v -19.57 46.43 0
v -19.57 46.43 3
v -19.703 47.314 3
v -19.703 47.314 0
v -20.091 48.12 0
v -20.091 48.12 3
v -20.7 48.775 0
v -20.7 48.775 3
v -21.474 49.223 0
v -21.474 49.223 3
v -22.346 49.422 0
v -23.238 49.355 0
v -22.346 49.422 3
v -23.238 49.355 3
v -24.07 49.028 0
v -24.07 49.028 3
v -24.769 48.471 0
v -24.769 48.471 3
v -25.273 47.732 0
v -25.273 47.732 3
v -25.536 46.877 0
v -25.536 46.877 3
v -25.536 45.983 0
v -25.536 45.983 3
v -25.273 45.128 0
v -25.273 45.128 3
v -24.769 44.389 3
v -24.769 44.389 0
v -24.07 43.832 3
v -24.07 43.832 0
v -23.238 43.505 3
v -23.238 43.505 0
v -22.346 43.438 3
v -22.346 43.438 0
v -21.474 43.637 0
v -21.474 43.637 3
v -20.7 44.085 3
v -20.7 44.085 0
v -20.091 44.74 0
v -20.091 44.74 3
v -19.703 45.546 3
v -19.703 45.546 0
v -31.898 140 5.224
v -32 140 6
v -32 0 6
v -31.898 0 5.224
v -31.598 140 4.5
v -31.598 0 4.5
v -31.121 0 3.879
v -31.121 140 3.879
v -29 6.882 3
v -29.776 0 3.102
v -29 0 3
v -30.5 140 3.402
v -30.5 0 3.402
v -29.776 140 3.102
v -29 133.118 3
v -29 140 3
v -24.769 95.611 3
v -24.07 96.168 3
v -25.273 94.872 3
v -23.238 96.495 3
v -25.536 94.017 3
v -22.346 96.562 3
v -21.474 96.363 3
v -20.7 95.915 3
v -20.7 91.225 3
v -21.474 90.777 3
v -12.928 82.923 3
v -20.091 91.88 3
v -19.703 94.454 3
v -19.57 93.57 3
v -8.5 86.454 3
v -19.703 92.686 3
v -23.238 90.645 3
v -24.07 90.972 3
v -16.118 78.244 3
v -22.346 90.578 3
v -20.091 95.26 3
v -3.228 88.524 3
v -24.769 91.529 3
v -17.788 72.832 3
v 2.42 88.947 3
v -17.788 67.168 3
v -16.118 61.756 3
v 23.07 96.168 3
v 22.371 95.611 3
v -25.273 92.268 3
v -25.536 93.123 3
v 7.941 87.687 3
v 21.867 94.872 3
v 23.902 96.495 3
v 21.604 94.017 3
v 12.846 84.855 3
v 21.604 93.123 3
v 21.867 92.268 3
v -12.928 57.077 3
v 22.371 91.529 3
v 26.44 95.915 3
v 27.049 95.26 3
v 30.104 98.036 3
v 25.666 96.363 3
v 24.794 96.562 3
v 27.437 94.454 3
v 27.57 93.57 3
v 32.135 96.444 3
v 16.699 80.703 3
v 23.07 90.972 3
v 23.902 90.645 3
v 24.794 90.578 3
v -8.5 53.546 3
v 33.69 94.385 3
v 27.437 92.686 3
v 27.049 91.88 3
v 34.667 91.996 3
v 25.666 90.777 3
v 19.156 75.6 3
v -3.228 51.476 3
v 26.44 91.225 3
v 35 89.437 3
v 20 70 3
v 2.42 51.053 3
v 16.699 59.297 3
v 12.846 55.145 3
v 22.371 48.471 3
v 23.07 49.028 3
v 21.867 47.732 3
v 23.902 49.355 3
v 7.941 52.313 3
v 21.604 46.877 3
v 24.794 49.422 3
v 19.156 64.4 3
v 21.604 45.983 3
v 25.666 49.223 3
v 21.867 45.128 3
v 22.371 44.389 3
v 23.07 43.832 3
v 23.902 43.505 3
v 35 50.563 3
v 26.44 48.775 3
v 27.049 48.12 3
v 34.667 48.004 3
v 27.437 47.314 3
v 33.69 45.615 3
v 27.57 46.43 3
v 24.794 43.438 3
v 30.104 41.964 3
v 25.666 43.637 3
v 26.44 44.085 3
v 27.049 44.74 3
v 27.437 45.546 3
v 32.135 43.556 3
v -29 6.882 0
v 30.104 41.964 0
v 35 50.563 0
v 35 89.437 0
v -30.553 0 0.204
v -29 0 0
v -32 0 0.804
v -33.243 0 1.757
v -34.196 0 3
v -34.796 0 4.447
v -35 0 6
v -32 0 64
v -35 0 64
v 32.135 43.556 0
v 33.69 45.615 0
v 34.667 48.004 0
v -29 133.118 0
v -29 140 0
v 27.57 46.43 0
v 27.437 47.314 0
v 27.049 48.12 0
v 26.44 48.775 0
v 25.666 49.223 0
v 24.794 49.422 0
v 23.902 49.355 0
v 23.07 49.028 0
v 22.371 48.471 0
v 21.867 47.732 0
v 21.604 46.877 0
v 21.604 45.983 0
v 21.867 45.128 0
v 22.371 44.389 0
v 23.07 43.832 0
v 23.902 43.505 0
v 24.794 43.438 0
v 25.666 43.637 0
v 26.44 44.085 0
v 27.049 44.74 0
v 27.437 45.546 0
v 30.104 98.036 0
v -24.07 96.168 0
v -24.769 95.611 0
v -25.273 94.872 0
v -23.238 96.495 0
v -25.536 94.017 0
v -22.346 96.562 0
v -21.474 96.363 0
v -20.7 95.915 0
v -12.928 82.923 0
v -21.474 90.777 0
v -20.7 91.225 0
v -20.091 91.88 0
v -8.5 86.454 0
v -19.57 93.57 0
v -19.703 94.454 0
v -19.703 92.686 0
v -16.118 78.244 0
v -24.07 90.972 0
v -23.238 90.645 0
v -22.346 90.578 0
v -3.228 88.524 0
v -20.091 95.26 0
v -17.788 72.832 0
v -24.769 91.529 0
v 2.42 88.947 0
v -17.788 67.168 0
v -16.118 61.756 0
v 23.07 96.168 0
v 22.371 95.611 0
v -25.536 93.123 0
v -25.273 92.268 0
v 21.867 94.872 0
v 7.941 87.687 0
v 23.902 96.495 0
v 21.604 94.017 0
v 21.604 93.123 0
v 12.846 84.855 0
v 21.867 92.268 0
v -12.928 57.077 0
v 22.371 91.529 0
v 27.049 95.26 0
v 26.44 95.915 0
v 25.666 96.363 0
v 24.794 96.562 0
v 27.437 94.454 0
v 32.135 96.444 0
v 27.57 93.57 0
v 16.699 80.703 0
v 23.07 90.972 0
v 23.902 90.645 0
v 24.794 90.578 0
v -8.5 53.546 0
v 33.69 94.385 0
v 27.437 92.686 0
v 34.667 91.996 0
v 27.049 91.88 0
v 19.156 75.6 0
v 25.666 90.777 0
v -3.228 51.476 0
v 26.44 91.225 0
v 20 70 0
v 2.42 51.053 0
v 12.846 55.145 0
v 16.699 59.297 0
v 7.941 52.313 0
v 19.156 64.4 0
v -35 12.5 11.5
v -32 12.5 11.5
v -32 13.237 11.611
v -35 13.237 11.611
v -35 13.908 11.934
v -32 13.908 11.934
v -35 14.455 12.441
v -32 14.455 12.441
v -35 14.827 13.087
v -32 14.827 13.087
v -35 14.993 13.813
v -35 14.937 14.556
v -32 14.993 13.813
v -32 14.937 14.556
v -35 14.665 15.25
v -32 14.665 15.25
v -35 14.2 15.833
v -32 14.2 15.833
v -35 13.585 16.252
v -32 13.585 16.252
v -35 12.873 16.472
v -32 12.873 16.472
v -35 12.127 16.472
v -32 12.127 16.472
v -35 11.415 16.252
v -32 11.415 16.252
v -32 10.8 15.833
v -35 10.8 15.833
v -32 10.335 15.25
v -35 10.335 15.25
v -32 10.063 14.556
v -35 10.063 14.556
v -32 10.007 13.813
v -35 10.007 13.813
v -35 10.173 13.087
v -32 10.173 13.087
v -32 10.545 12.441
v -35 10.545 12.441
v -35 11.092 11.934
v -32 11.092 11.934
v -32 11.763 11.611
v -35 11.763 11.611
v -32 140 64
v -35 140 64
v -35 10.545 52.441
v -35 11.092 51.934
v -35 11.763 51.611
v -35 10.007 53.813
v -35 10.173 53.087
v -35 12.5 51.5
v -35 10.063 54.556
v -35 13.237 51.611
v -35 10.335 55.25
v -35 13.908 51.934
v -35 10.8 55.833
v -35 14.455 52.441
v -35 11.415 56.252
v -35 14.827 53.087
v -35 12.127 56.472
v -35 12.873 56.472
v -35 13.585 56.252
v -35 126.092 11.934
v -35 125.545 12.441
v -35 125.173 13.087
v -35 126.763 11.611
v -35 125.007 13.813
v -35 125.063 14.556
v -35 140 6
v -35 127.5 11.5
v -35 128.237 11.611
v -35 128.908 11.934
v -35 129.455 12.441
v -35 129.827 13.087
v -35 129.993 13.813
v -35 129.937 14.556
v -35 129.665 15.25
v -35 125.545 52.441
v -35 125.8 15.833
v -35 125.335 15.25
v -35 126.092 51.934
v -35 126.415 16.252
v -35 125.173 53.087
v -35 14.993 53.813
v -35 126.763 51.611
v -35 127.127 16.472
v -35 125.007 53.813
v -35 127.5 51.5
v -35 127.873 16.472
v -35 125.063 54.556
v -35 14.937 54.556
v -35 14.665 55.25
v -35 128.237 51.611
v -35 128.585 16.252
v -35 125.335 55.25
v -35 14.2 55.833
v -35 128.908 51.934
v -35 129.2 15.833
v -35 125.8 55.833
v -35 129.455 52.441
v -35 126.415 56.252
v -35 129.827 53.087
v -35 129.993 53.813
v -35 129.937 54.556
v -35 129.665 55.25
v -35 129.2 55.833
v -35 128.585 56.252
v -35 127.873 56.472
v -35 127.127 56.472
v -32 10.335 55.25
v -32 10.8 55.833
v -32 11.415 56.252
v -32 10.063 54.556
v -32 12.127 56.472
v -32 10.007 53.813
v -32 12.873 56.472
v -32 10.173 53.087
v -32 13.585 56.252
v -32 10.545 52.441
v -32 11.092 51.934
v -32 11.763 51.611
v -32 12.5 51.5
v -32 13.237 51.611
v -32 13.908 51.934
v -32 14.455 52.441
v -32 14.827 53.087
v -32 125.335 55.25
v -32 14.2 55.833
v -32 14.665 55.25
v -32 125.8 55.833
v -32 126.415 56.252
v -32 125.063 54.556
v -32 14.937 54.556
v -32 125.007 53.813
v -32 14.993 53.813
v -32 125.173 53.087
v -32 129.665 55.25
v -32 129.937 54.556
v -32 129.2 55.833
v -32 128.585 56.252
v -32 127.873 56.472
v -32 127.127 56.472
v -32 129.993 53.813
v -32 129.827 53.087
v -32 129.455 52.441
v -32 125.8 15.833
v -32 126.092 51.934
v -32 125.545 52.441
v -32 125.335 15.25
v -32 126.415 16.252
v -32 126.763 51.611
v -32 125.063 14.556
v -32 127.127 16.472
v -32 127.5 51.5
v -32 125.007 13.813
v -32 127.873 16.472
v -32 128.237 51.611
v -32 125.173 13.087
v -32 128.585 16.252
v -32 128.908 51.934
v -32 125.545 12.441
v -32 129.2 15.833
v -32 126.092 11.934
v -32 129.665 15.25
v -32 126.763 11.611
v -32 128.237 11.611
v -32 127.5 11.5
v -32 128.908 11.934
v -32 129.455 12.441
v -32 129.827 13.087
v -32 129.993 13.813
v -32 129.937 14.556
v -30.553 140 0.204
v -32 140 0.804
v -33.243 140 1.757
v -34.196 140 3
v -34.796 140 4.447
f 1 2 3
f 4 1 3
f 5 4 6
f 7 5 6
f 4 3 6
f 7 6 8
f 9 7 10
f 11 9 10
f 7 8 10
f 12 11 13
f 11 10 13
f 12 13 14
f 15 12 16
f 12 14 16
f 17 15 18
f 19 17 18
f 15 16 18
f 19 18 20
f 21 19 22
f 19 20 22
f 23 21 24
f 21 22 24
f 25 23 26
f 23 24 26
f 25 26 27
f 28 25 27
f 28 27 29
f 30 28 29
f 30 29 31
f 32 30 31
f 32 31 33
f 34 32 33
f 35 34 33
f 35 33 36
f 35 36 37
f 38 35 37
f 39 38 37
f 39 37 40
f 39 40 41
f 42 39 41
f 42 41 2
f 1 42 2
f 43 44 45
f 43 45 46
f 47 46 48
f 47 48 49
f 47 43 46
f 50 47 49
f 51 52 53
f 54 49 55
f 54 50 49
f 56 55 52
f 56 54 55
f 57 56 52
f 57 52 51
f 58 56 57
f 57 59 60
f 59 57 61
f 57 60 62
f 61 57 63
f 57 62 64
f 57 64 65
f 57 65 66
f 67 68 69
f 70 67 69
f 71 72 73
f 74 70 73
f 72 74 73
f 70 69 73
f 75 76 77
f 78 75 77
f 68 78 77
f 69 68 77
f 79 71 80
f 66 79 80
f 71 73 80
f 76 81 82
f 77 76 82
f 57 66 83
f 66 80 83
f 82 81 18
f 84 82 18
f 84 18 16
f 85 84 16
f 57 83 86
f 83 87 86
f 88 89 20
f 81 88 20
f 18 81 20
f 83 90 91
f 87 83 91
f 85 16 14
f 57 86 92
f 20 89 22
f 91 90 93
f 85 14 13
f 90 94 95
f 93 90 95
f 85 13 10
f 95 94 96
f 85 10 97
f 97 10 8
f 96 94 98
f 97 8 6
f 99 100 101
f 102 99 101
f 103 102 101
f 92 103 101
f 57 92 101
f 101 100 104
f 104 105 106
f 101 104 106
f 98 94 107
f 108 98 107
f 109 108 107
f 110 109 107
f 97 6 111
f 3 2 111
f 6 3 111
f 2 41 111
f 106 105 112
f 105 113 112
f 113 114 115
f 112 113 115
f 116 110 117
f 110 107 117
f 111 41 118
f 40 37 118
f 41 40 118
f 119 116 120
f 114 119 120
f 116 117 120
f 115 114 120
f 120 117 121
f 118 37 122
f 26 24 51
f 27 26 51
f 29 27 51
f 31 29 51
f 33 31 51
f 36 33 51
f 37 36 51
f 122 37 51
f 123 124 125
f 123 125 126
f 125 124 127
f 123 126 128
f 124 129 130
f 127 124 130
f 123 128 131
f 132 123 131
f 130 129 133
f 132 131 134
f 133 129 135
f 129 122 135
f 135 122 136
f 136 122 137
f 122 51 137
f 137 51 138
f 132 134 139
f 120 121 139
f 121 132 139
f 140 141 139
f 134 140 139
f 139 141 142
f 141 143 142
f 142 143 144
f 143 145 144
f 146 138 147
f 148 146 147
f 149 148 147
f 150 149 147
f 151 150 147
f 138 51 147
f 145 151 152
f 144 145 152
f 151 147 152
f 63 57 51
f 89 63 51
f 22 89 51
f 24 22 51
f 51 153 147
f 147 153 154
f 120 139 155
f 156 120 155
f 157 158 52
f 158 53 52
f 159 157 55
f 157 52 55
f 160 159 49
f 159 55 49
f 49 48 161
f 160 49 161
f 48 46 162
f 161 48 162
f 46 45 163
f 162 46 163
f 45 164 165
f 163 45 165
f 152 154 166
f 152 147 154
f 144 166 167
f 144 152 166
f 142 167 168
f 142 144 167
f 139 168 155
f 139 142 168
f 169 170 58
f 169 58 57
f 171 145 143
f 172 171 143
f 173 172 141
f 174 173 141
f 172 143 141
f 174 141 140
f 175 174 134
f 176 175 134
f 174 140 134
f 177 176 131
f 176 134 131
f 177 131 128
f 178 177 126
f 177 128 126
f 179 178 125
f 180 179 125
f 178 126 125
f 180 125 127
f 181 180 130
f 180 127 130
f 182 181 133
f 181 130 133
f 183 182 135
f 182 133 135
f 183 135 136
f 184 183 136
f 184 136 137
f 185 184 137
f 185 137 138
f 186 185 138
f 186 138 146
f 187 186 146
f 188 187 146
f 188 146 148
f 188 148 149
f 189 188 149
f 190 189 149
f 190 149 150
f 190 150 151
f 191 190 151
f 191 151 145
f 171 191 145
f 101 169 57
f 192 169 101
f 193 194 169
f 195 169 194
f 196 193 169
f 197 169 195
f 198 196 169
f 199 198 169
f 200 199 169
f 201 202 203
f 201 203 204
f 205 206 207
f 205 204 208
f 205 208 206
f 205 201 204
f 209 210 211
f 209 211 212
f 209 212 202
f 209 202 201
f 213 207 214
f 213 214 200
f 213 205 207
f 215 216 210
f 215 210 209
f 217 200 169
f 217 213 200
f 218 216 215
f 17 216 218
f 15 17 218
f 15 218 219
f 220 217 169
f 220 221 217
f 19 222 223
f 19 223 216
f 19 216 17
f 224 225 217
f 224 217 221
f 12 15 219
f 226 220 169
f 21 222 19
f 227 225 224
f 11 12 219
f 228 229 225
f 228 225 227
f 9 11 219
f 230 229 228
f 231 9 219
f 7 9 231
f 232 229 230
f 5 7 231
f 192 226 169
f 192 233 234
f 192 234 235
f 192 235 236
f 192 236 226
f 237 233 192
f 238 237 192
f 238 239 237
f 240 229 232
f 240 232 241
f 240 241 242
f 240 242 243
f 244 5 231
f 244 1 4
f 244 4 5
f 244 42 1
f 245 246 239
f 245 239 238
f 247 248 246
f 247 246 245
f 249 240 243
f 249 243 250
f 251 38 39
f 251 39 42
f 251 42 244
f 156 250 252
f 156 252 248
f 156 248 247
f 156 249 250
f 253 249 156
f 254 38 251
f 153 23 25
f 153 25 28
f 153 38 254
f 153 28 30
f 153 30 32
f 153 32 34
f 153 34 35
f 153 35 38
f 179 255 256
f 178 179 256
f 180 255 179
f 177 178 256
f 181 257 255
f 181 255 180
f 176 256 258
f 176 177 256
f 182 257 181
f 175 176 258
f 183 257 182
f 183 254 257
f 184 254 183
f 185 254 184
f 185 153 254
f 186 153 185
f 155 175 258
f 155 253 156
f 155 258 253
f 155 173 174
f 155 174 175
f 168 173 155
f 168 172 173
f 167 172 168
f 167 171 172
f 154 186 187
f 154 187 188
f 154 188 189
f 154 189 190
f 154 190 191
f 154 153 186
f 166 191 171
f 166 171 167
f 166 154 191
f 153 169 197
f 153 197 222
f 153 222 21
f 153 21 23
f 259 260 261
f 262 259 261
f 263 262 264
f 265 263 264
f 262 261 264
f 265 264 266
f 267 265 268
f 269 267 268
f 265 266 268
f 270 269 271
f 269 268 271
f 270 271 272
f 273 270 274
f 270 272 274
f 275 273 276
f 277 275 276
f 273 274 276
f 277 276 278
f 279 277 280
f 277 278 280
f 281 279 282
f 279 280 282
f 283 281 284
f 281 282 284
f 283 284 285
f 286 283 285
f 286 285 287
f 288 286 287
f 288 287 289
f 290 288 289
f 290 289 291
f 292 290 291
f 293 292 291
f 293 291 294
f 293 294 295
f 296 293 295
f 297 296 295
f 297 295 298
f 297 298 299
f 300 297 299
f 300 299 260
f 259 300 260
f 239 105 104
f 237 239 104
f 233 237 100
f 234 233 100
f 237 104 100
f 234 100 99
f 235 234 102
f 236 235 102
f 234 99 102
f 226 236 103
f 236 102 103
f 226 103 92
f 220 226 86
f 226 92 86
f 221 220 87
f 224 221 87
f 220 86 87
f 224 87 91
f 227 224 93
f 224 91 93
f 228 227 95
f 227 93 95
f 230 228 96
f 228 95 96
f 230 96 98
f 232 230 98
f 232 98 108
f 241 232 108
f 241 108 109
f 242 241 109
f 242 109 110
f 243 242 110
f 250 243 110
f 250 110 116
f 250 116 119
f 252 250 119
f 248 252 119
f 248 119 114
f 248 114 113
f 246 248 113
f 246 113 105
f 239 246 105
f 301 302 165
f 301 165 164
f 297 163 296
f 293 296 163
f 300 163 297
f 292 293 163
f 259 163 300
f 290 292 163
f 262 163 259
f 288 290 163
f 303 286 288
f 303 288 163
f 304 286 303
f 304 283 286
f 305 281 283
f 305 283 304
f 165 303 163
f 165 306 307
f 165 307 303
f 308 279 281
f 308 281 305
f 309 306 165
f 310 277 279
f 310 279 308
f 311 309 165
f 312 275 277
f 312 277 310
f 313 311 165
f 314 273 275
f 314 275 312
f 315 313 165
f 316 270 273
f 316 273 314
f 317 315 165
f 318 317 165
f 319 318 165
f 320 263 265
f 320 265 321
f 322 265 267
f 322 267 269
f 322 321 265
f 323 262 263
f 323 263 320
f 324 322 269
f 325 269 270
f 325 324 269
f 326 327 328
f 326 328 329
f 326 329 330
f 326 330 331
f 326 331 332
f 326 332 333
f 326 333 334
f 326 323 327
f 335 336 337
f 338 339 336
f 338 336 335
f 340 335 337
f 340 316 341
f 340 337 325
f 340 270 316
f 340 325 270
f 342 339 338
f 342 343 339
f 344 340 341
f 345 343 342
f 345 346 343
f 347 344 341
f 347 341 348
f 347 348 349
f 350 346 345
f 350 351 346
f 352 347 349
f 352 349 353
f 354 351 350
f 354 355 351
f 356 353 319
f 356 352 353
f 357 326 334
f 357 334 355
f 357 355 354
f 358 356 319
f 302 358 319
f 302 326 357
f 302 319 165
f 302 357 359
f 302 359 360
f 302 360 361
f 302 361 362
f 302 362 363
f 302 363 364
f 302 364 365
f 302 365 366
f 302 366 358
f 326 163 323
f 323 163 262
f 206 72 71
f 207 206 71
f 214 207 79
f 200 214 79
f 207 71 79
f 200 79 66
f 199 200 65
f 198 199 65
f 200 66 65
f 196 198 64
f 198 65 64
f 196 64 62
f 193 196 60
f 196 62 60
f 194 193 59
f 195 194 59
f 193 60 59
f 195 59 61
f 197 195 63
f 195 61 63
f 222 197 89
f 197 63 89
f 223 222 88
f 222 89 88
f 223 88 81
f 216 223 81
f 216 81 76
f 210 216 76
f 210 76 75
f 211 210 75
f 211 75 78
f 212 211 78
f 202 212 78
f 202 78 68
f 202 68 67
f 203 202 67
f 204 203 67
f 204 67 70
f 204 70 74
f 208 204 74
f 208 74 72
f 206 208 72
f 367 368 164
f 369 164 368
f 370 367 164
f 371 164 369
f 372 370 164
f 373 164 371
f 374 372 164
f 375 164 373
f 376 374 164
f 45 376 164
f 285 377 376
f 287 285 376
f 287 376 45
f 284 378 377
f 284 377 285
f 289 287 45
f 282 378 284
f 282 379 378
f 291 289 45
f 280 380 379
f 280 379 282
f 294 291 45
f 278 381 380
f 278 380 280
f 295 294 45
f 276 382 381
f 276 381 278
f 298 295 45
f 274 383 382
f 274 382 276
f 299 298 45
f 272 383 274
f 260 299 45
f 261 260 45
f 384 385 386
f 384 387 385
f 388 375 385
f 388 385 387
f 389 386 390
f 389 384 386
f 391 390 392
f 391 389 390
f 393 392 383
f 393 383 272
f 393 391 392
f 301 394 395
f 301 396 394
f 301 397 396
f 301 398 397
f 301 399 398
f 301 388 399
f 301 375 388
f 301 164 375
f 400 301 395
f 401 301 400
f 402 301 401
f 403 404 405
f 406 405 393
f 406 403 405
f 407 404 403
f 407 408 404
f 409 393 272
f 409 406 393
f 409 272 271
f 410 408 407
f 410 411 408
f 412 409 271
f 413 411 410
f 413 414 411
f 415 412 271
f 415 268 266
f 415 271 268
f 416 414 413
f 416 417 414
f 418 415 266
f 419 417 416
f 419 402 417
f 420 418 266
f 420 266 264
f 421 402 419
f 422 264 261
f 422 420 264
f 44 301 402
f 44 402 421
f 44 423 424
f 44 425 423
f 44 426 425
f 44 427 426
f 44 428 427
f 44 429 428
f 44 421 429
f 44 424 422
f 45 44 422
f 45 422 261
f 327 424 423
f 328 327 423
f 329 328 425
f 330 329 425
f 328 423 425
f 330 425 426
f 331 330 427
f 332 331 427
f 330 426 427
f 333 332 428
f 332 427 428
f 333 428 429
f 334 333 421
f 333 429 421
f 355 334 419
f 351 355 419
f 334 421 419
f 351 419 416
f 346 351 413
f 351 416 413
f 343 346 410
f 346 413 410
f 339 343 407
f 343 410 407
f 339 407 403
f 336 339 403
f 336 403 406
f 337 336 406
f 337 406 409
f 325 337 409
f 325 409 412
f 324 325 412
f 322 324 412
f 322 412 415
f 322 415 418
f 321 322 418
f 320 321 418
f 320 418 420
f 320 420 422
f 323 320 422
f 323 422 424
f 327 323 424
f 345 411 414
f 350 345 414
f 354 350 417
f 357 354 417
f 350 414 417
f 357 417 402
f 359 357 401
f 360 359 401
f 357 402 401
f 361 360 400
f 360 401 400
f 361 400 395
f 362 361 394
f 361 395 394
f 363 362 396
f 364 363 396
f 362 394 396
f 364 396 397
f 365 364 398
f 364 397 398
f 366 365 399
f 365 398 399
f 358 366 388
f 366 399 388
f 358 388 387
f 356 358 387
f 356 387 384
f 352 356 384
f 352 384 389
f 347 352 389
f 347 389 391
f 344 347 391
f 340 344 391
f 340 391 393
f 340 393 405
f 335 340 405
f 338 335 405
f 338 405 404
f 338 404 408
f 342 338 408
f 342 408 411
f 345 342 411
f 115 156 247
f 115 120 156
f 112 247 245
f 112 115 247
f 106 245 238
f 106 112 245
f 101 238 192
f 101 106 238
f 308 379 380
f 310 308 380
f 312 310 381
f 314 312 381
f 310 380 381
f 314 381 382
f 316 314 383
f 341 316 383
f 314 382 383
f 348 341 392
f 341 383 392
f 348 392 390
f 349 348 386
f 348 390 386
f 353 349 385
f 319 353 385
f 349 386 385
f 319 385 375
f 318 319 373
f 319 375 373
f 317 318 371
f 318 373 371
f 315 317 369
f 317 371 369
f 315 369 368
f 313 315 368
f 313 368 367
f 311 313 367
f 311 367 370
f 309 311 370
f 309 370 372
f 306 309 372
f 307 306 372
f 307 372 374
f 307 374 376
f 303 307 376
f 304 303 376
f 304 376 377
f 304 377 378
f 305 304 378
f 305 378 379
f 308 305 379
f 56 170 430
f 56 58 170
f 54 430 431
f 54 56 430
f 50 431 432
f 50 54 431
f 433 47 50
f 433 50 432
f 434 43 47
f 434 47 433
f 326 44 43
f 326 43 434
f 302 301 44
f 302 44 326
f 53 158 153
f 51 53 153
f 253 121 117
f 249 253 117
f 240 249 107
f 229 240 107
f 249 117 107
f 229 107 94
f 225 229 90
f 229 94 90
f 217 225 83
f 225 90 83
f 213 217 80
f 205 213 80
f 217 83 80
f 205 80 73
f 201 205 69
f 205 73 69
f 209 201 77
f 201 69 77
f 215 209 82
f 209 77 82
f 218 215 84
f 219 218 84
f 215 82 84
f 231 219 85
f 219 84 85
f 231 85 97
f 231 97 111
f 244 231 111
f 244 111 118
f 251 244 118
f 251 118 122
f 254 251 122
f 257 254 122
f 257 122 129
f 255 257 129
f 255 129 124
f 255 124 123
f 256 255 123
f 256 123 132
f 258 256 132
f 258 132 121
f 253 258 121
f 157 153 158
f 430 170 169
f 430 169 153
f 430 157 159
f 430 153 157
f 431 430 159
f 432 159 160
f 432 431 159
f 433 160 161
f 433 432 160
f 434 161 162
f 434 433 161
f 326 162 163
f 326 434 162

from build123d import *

# Parameters (mm, degrees)
SKETCH1_W                    = 70
SKETCH1_H                    = 3
BASE_FLANGE1_DEPTH           = 140
EDGE_FLANGE1_STRIP_W         = 18
EDGE_FLANGE1_STRIP_H         = 3
EDGE_FLANGE1_STRIP_CUT_DEPTH = 140
EDGE_FLANGE1_DEPTH           = 140
SKETCH9_R                    = 19
SKETCH9_R_2                  = 3
CUT_EXTRUDE1_DEPTH           = 10
SKETCH10_R                   = 2.5
CUT_EXTRUDE2_DEPTH           = 10
SKETCH11_R                   = 2.5
CUT_EXTRUDE3_DEPTH           = 3
CUT_EXTRUDE4_DEPTH           = 10
FILLET1_R                    = 10
FILLET2_R                    = 10


# Sheet-metal steps are written as plain solids
with BuildPart() as part:
    # Sketch1 → Base-Flange1 (new body)
    with BuildSketch(Plane(origin=(0, 0, 0), x_dir=(1, 0, 0), z_dir=(0, 1, 0))):
        with Locations((0, -1.5)):
            Rectangle(SKETCH1_W, SKETCH1_H)
    extrude(amount=BASE_FLANGE1_DEPTH)

    # Edge-Flange1 strip (across the edge) → Edge-Flange1 strip cut (cut)
    with BuildSketch(Plane(origin=(-35, 140, 3), x_dir=(1, 0, 0), z_dir=(0, -1, 0))):
        with Locations((-3, -1.5)):
            Rectangle(EDGE_FLANGE1_STRIP_W, EDGE_FLANGE1_STRIP_H)
    extrude(amount=EDGE_FLANGE1_STRIP_CUT_DEPTH, mode=Mode.SUBTRACT)

    # Edge-Flange1 section (across the edge) → Edge-Flange1 (add)
    with BuildSketch(Plane(origin=(-35, 140, 3), x_dir=(1, 0, 0), z_dir=(0, -1, 0))):
        with BuildLine():
            Line((0, 3), (0, 61))
            Line((0, 61), (3, 61))
            Line((3, 61), (3, 3))
            ThreePointArc((3, 3), (3.878679656, 0.878679656), (6, 0))
            Line((6, 0), (6, -3))
            ThreePointArc((6, -3), (1.757359313, -1.242640687), (0, 3))
        make_face()
    extrude(amount=EDGE_FLANGE1_DEPTH)

    # Sketch9 → Cut-Extrude1 (cut)
    with BuildSketch(Plane.XY.offset(3)):
        with Locations((1, 70)):
            Circle(SKETCH9_R)
        with Locations((-22.57, 93.57)):
            Circle(SKETCH9_R_2)
        with Locations((24.57, 93.57)):
            Circle(SKETCH9_R_2)
        with Locations((24.57, 46.43)):
            Circle(SKETCH9_R_2)
        with Locations((-22.57, 46.43)):
            Circle(SKETCH9_R_2)
    extrude(amount=-CUT_EXTRUDE1_DEPTH, mode=Mode.SUBTRACT)

    # Sketch10 → Cut-Extrude2 (cut)
    with BuildSketch(Plane(origin=(-32, 0, 0), x_dir=(0, 0, -1), z_dir=(1, 0, 0))):
        with Locations((-54, 127.5)):
            Circle(SKETCH10_R)
        with Locations((-14, 127.5)):
            Circle(SKETCH10_R)
        with Locations((-14, 12.5)):
            Circle(SKETCH10_R)
        with Locations((-54, 12.5)):
            Circle(SKETCH10_R)
    extrude(amount=-CUT_EXTRUDE2_DEPTH, mode=Mode.SUBTRACT)

    # Sketch11 → Cut-Extrude3 (cut)
    with BuildSketch(Plane.XY.offset(3)):
        with Locations((0, 120)):
            Circle(SKETCH11_R)
        with Locations((0, 20)):
            Circle(SKETCH11_R)
    extrude(amount=-CUT_EXTRUDE3_DEPTH, mode=Mode.SUBTRACT)

    # Sketch12 → Cut-Extrude4 (cut)
    with BuildSketch(Plane(origin=(0, 0, 0), x_dir=(-1, 0, 0), z_dir=(0, 0, -1))):
        Polygon((-35, 95.130192279), (-35, 140), (29, 140), (29, 133.118302038), align=None)
        Polygon((29, 0), (29, 6.881697962), (-35, 44.869807721), (-35, 0), align=None)
    extrude(amount=-CUT_EXTRUDE4_DEPTH, mode=Mode.SUBTRACT)

    # Fillet1
    fillet1_edges = [part.edges().sort_by_distance(p)[0] for p in [
        (35, 44.869807721, 1.5),
    ]]
    fillet(fillet1_edges, radius=FILLET1_R)

    # Fillet2
    fillet2_edges = [part.edges().sort_by_distance(p)[0] for p in [
        (35, 95.130192279, 1.5),
    ]]
    fillet(fillet2_edges, radius=FILLET2_R)


solid = part.part
